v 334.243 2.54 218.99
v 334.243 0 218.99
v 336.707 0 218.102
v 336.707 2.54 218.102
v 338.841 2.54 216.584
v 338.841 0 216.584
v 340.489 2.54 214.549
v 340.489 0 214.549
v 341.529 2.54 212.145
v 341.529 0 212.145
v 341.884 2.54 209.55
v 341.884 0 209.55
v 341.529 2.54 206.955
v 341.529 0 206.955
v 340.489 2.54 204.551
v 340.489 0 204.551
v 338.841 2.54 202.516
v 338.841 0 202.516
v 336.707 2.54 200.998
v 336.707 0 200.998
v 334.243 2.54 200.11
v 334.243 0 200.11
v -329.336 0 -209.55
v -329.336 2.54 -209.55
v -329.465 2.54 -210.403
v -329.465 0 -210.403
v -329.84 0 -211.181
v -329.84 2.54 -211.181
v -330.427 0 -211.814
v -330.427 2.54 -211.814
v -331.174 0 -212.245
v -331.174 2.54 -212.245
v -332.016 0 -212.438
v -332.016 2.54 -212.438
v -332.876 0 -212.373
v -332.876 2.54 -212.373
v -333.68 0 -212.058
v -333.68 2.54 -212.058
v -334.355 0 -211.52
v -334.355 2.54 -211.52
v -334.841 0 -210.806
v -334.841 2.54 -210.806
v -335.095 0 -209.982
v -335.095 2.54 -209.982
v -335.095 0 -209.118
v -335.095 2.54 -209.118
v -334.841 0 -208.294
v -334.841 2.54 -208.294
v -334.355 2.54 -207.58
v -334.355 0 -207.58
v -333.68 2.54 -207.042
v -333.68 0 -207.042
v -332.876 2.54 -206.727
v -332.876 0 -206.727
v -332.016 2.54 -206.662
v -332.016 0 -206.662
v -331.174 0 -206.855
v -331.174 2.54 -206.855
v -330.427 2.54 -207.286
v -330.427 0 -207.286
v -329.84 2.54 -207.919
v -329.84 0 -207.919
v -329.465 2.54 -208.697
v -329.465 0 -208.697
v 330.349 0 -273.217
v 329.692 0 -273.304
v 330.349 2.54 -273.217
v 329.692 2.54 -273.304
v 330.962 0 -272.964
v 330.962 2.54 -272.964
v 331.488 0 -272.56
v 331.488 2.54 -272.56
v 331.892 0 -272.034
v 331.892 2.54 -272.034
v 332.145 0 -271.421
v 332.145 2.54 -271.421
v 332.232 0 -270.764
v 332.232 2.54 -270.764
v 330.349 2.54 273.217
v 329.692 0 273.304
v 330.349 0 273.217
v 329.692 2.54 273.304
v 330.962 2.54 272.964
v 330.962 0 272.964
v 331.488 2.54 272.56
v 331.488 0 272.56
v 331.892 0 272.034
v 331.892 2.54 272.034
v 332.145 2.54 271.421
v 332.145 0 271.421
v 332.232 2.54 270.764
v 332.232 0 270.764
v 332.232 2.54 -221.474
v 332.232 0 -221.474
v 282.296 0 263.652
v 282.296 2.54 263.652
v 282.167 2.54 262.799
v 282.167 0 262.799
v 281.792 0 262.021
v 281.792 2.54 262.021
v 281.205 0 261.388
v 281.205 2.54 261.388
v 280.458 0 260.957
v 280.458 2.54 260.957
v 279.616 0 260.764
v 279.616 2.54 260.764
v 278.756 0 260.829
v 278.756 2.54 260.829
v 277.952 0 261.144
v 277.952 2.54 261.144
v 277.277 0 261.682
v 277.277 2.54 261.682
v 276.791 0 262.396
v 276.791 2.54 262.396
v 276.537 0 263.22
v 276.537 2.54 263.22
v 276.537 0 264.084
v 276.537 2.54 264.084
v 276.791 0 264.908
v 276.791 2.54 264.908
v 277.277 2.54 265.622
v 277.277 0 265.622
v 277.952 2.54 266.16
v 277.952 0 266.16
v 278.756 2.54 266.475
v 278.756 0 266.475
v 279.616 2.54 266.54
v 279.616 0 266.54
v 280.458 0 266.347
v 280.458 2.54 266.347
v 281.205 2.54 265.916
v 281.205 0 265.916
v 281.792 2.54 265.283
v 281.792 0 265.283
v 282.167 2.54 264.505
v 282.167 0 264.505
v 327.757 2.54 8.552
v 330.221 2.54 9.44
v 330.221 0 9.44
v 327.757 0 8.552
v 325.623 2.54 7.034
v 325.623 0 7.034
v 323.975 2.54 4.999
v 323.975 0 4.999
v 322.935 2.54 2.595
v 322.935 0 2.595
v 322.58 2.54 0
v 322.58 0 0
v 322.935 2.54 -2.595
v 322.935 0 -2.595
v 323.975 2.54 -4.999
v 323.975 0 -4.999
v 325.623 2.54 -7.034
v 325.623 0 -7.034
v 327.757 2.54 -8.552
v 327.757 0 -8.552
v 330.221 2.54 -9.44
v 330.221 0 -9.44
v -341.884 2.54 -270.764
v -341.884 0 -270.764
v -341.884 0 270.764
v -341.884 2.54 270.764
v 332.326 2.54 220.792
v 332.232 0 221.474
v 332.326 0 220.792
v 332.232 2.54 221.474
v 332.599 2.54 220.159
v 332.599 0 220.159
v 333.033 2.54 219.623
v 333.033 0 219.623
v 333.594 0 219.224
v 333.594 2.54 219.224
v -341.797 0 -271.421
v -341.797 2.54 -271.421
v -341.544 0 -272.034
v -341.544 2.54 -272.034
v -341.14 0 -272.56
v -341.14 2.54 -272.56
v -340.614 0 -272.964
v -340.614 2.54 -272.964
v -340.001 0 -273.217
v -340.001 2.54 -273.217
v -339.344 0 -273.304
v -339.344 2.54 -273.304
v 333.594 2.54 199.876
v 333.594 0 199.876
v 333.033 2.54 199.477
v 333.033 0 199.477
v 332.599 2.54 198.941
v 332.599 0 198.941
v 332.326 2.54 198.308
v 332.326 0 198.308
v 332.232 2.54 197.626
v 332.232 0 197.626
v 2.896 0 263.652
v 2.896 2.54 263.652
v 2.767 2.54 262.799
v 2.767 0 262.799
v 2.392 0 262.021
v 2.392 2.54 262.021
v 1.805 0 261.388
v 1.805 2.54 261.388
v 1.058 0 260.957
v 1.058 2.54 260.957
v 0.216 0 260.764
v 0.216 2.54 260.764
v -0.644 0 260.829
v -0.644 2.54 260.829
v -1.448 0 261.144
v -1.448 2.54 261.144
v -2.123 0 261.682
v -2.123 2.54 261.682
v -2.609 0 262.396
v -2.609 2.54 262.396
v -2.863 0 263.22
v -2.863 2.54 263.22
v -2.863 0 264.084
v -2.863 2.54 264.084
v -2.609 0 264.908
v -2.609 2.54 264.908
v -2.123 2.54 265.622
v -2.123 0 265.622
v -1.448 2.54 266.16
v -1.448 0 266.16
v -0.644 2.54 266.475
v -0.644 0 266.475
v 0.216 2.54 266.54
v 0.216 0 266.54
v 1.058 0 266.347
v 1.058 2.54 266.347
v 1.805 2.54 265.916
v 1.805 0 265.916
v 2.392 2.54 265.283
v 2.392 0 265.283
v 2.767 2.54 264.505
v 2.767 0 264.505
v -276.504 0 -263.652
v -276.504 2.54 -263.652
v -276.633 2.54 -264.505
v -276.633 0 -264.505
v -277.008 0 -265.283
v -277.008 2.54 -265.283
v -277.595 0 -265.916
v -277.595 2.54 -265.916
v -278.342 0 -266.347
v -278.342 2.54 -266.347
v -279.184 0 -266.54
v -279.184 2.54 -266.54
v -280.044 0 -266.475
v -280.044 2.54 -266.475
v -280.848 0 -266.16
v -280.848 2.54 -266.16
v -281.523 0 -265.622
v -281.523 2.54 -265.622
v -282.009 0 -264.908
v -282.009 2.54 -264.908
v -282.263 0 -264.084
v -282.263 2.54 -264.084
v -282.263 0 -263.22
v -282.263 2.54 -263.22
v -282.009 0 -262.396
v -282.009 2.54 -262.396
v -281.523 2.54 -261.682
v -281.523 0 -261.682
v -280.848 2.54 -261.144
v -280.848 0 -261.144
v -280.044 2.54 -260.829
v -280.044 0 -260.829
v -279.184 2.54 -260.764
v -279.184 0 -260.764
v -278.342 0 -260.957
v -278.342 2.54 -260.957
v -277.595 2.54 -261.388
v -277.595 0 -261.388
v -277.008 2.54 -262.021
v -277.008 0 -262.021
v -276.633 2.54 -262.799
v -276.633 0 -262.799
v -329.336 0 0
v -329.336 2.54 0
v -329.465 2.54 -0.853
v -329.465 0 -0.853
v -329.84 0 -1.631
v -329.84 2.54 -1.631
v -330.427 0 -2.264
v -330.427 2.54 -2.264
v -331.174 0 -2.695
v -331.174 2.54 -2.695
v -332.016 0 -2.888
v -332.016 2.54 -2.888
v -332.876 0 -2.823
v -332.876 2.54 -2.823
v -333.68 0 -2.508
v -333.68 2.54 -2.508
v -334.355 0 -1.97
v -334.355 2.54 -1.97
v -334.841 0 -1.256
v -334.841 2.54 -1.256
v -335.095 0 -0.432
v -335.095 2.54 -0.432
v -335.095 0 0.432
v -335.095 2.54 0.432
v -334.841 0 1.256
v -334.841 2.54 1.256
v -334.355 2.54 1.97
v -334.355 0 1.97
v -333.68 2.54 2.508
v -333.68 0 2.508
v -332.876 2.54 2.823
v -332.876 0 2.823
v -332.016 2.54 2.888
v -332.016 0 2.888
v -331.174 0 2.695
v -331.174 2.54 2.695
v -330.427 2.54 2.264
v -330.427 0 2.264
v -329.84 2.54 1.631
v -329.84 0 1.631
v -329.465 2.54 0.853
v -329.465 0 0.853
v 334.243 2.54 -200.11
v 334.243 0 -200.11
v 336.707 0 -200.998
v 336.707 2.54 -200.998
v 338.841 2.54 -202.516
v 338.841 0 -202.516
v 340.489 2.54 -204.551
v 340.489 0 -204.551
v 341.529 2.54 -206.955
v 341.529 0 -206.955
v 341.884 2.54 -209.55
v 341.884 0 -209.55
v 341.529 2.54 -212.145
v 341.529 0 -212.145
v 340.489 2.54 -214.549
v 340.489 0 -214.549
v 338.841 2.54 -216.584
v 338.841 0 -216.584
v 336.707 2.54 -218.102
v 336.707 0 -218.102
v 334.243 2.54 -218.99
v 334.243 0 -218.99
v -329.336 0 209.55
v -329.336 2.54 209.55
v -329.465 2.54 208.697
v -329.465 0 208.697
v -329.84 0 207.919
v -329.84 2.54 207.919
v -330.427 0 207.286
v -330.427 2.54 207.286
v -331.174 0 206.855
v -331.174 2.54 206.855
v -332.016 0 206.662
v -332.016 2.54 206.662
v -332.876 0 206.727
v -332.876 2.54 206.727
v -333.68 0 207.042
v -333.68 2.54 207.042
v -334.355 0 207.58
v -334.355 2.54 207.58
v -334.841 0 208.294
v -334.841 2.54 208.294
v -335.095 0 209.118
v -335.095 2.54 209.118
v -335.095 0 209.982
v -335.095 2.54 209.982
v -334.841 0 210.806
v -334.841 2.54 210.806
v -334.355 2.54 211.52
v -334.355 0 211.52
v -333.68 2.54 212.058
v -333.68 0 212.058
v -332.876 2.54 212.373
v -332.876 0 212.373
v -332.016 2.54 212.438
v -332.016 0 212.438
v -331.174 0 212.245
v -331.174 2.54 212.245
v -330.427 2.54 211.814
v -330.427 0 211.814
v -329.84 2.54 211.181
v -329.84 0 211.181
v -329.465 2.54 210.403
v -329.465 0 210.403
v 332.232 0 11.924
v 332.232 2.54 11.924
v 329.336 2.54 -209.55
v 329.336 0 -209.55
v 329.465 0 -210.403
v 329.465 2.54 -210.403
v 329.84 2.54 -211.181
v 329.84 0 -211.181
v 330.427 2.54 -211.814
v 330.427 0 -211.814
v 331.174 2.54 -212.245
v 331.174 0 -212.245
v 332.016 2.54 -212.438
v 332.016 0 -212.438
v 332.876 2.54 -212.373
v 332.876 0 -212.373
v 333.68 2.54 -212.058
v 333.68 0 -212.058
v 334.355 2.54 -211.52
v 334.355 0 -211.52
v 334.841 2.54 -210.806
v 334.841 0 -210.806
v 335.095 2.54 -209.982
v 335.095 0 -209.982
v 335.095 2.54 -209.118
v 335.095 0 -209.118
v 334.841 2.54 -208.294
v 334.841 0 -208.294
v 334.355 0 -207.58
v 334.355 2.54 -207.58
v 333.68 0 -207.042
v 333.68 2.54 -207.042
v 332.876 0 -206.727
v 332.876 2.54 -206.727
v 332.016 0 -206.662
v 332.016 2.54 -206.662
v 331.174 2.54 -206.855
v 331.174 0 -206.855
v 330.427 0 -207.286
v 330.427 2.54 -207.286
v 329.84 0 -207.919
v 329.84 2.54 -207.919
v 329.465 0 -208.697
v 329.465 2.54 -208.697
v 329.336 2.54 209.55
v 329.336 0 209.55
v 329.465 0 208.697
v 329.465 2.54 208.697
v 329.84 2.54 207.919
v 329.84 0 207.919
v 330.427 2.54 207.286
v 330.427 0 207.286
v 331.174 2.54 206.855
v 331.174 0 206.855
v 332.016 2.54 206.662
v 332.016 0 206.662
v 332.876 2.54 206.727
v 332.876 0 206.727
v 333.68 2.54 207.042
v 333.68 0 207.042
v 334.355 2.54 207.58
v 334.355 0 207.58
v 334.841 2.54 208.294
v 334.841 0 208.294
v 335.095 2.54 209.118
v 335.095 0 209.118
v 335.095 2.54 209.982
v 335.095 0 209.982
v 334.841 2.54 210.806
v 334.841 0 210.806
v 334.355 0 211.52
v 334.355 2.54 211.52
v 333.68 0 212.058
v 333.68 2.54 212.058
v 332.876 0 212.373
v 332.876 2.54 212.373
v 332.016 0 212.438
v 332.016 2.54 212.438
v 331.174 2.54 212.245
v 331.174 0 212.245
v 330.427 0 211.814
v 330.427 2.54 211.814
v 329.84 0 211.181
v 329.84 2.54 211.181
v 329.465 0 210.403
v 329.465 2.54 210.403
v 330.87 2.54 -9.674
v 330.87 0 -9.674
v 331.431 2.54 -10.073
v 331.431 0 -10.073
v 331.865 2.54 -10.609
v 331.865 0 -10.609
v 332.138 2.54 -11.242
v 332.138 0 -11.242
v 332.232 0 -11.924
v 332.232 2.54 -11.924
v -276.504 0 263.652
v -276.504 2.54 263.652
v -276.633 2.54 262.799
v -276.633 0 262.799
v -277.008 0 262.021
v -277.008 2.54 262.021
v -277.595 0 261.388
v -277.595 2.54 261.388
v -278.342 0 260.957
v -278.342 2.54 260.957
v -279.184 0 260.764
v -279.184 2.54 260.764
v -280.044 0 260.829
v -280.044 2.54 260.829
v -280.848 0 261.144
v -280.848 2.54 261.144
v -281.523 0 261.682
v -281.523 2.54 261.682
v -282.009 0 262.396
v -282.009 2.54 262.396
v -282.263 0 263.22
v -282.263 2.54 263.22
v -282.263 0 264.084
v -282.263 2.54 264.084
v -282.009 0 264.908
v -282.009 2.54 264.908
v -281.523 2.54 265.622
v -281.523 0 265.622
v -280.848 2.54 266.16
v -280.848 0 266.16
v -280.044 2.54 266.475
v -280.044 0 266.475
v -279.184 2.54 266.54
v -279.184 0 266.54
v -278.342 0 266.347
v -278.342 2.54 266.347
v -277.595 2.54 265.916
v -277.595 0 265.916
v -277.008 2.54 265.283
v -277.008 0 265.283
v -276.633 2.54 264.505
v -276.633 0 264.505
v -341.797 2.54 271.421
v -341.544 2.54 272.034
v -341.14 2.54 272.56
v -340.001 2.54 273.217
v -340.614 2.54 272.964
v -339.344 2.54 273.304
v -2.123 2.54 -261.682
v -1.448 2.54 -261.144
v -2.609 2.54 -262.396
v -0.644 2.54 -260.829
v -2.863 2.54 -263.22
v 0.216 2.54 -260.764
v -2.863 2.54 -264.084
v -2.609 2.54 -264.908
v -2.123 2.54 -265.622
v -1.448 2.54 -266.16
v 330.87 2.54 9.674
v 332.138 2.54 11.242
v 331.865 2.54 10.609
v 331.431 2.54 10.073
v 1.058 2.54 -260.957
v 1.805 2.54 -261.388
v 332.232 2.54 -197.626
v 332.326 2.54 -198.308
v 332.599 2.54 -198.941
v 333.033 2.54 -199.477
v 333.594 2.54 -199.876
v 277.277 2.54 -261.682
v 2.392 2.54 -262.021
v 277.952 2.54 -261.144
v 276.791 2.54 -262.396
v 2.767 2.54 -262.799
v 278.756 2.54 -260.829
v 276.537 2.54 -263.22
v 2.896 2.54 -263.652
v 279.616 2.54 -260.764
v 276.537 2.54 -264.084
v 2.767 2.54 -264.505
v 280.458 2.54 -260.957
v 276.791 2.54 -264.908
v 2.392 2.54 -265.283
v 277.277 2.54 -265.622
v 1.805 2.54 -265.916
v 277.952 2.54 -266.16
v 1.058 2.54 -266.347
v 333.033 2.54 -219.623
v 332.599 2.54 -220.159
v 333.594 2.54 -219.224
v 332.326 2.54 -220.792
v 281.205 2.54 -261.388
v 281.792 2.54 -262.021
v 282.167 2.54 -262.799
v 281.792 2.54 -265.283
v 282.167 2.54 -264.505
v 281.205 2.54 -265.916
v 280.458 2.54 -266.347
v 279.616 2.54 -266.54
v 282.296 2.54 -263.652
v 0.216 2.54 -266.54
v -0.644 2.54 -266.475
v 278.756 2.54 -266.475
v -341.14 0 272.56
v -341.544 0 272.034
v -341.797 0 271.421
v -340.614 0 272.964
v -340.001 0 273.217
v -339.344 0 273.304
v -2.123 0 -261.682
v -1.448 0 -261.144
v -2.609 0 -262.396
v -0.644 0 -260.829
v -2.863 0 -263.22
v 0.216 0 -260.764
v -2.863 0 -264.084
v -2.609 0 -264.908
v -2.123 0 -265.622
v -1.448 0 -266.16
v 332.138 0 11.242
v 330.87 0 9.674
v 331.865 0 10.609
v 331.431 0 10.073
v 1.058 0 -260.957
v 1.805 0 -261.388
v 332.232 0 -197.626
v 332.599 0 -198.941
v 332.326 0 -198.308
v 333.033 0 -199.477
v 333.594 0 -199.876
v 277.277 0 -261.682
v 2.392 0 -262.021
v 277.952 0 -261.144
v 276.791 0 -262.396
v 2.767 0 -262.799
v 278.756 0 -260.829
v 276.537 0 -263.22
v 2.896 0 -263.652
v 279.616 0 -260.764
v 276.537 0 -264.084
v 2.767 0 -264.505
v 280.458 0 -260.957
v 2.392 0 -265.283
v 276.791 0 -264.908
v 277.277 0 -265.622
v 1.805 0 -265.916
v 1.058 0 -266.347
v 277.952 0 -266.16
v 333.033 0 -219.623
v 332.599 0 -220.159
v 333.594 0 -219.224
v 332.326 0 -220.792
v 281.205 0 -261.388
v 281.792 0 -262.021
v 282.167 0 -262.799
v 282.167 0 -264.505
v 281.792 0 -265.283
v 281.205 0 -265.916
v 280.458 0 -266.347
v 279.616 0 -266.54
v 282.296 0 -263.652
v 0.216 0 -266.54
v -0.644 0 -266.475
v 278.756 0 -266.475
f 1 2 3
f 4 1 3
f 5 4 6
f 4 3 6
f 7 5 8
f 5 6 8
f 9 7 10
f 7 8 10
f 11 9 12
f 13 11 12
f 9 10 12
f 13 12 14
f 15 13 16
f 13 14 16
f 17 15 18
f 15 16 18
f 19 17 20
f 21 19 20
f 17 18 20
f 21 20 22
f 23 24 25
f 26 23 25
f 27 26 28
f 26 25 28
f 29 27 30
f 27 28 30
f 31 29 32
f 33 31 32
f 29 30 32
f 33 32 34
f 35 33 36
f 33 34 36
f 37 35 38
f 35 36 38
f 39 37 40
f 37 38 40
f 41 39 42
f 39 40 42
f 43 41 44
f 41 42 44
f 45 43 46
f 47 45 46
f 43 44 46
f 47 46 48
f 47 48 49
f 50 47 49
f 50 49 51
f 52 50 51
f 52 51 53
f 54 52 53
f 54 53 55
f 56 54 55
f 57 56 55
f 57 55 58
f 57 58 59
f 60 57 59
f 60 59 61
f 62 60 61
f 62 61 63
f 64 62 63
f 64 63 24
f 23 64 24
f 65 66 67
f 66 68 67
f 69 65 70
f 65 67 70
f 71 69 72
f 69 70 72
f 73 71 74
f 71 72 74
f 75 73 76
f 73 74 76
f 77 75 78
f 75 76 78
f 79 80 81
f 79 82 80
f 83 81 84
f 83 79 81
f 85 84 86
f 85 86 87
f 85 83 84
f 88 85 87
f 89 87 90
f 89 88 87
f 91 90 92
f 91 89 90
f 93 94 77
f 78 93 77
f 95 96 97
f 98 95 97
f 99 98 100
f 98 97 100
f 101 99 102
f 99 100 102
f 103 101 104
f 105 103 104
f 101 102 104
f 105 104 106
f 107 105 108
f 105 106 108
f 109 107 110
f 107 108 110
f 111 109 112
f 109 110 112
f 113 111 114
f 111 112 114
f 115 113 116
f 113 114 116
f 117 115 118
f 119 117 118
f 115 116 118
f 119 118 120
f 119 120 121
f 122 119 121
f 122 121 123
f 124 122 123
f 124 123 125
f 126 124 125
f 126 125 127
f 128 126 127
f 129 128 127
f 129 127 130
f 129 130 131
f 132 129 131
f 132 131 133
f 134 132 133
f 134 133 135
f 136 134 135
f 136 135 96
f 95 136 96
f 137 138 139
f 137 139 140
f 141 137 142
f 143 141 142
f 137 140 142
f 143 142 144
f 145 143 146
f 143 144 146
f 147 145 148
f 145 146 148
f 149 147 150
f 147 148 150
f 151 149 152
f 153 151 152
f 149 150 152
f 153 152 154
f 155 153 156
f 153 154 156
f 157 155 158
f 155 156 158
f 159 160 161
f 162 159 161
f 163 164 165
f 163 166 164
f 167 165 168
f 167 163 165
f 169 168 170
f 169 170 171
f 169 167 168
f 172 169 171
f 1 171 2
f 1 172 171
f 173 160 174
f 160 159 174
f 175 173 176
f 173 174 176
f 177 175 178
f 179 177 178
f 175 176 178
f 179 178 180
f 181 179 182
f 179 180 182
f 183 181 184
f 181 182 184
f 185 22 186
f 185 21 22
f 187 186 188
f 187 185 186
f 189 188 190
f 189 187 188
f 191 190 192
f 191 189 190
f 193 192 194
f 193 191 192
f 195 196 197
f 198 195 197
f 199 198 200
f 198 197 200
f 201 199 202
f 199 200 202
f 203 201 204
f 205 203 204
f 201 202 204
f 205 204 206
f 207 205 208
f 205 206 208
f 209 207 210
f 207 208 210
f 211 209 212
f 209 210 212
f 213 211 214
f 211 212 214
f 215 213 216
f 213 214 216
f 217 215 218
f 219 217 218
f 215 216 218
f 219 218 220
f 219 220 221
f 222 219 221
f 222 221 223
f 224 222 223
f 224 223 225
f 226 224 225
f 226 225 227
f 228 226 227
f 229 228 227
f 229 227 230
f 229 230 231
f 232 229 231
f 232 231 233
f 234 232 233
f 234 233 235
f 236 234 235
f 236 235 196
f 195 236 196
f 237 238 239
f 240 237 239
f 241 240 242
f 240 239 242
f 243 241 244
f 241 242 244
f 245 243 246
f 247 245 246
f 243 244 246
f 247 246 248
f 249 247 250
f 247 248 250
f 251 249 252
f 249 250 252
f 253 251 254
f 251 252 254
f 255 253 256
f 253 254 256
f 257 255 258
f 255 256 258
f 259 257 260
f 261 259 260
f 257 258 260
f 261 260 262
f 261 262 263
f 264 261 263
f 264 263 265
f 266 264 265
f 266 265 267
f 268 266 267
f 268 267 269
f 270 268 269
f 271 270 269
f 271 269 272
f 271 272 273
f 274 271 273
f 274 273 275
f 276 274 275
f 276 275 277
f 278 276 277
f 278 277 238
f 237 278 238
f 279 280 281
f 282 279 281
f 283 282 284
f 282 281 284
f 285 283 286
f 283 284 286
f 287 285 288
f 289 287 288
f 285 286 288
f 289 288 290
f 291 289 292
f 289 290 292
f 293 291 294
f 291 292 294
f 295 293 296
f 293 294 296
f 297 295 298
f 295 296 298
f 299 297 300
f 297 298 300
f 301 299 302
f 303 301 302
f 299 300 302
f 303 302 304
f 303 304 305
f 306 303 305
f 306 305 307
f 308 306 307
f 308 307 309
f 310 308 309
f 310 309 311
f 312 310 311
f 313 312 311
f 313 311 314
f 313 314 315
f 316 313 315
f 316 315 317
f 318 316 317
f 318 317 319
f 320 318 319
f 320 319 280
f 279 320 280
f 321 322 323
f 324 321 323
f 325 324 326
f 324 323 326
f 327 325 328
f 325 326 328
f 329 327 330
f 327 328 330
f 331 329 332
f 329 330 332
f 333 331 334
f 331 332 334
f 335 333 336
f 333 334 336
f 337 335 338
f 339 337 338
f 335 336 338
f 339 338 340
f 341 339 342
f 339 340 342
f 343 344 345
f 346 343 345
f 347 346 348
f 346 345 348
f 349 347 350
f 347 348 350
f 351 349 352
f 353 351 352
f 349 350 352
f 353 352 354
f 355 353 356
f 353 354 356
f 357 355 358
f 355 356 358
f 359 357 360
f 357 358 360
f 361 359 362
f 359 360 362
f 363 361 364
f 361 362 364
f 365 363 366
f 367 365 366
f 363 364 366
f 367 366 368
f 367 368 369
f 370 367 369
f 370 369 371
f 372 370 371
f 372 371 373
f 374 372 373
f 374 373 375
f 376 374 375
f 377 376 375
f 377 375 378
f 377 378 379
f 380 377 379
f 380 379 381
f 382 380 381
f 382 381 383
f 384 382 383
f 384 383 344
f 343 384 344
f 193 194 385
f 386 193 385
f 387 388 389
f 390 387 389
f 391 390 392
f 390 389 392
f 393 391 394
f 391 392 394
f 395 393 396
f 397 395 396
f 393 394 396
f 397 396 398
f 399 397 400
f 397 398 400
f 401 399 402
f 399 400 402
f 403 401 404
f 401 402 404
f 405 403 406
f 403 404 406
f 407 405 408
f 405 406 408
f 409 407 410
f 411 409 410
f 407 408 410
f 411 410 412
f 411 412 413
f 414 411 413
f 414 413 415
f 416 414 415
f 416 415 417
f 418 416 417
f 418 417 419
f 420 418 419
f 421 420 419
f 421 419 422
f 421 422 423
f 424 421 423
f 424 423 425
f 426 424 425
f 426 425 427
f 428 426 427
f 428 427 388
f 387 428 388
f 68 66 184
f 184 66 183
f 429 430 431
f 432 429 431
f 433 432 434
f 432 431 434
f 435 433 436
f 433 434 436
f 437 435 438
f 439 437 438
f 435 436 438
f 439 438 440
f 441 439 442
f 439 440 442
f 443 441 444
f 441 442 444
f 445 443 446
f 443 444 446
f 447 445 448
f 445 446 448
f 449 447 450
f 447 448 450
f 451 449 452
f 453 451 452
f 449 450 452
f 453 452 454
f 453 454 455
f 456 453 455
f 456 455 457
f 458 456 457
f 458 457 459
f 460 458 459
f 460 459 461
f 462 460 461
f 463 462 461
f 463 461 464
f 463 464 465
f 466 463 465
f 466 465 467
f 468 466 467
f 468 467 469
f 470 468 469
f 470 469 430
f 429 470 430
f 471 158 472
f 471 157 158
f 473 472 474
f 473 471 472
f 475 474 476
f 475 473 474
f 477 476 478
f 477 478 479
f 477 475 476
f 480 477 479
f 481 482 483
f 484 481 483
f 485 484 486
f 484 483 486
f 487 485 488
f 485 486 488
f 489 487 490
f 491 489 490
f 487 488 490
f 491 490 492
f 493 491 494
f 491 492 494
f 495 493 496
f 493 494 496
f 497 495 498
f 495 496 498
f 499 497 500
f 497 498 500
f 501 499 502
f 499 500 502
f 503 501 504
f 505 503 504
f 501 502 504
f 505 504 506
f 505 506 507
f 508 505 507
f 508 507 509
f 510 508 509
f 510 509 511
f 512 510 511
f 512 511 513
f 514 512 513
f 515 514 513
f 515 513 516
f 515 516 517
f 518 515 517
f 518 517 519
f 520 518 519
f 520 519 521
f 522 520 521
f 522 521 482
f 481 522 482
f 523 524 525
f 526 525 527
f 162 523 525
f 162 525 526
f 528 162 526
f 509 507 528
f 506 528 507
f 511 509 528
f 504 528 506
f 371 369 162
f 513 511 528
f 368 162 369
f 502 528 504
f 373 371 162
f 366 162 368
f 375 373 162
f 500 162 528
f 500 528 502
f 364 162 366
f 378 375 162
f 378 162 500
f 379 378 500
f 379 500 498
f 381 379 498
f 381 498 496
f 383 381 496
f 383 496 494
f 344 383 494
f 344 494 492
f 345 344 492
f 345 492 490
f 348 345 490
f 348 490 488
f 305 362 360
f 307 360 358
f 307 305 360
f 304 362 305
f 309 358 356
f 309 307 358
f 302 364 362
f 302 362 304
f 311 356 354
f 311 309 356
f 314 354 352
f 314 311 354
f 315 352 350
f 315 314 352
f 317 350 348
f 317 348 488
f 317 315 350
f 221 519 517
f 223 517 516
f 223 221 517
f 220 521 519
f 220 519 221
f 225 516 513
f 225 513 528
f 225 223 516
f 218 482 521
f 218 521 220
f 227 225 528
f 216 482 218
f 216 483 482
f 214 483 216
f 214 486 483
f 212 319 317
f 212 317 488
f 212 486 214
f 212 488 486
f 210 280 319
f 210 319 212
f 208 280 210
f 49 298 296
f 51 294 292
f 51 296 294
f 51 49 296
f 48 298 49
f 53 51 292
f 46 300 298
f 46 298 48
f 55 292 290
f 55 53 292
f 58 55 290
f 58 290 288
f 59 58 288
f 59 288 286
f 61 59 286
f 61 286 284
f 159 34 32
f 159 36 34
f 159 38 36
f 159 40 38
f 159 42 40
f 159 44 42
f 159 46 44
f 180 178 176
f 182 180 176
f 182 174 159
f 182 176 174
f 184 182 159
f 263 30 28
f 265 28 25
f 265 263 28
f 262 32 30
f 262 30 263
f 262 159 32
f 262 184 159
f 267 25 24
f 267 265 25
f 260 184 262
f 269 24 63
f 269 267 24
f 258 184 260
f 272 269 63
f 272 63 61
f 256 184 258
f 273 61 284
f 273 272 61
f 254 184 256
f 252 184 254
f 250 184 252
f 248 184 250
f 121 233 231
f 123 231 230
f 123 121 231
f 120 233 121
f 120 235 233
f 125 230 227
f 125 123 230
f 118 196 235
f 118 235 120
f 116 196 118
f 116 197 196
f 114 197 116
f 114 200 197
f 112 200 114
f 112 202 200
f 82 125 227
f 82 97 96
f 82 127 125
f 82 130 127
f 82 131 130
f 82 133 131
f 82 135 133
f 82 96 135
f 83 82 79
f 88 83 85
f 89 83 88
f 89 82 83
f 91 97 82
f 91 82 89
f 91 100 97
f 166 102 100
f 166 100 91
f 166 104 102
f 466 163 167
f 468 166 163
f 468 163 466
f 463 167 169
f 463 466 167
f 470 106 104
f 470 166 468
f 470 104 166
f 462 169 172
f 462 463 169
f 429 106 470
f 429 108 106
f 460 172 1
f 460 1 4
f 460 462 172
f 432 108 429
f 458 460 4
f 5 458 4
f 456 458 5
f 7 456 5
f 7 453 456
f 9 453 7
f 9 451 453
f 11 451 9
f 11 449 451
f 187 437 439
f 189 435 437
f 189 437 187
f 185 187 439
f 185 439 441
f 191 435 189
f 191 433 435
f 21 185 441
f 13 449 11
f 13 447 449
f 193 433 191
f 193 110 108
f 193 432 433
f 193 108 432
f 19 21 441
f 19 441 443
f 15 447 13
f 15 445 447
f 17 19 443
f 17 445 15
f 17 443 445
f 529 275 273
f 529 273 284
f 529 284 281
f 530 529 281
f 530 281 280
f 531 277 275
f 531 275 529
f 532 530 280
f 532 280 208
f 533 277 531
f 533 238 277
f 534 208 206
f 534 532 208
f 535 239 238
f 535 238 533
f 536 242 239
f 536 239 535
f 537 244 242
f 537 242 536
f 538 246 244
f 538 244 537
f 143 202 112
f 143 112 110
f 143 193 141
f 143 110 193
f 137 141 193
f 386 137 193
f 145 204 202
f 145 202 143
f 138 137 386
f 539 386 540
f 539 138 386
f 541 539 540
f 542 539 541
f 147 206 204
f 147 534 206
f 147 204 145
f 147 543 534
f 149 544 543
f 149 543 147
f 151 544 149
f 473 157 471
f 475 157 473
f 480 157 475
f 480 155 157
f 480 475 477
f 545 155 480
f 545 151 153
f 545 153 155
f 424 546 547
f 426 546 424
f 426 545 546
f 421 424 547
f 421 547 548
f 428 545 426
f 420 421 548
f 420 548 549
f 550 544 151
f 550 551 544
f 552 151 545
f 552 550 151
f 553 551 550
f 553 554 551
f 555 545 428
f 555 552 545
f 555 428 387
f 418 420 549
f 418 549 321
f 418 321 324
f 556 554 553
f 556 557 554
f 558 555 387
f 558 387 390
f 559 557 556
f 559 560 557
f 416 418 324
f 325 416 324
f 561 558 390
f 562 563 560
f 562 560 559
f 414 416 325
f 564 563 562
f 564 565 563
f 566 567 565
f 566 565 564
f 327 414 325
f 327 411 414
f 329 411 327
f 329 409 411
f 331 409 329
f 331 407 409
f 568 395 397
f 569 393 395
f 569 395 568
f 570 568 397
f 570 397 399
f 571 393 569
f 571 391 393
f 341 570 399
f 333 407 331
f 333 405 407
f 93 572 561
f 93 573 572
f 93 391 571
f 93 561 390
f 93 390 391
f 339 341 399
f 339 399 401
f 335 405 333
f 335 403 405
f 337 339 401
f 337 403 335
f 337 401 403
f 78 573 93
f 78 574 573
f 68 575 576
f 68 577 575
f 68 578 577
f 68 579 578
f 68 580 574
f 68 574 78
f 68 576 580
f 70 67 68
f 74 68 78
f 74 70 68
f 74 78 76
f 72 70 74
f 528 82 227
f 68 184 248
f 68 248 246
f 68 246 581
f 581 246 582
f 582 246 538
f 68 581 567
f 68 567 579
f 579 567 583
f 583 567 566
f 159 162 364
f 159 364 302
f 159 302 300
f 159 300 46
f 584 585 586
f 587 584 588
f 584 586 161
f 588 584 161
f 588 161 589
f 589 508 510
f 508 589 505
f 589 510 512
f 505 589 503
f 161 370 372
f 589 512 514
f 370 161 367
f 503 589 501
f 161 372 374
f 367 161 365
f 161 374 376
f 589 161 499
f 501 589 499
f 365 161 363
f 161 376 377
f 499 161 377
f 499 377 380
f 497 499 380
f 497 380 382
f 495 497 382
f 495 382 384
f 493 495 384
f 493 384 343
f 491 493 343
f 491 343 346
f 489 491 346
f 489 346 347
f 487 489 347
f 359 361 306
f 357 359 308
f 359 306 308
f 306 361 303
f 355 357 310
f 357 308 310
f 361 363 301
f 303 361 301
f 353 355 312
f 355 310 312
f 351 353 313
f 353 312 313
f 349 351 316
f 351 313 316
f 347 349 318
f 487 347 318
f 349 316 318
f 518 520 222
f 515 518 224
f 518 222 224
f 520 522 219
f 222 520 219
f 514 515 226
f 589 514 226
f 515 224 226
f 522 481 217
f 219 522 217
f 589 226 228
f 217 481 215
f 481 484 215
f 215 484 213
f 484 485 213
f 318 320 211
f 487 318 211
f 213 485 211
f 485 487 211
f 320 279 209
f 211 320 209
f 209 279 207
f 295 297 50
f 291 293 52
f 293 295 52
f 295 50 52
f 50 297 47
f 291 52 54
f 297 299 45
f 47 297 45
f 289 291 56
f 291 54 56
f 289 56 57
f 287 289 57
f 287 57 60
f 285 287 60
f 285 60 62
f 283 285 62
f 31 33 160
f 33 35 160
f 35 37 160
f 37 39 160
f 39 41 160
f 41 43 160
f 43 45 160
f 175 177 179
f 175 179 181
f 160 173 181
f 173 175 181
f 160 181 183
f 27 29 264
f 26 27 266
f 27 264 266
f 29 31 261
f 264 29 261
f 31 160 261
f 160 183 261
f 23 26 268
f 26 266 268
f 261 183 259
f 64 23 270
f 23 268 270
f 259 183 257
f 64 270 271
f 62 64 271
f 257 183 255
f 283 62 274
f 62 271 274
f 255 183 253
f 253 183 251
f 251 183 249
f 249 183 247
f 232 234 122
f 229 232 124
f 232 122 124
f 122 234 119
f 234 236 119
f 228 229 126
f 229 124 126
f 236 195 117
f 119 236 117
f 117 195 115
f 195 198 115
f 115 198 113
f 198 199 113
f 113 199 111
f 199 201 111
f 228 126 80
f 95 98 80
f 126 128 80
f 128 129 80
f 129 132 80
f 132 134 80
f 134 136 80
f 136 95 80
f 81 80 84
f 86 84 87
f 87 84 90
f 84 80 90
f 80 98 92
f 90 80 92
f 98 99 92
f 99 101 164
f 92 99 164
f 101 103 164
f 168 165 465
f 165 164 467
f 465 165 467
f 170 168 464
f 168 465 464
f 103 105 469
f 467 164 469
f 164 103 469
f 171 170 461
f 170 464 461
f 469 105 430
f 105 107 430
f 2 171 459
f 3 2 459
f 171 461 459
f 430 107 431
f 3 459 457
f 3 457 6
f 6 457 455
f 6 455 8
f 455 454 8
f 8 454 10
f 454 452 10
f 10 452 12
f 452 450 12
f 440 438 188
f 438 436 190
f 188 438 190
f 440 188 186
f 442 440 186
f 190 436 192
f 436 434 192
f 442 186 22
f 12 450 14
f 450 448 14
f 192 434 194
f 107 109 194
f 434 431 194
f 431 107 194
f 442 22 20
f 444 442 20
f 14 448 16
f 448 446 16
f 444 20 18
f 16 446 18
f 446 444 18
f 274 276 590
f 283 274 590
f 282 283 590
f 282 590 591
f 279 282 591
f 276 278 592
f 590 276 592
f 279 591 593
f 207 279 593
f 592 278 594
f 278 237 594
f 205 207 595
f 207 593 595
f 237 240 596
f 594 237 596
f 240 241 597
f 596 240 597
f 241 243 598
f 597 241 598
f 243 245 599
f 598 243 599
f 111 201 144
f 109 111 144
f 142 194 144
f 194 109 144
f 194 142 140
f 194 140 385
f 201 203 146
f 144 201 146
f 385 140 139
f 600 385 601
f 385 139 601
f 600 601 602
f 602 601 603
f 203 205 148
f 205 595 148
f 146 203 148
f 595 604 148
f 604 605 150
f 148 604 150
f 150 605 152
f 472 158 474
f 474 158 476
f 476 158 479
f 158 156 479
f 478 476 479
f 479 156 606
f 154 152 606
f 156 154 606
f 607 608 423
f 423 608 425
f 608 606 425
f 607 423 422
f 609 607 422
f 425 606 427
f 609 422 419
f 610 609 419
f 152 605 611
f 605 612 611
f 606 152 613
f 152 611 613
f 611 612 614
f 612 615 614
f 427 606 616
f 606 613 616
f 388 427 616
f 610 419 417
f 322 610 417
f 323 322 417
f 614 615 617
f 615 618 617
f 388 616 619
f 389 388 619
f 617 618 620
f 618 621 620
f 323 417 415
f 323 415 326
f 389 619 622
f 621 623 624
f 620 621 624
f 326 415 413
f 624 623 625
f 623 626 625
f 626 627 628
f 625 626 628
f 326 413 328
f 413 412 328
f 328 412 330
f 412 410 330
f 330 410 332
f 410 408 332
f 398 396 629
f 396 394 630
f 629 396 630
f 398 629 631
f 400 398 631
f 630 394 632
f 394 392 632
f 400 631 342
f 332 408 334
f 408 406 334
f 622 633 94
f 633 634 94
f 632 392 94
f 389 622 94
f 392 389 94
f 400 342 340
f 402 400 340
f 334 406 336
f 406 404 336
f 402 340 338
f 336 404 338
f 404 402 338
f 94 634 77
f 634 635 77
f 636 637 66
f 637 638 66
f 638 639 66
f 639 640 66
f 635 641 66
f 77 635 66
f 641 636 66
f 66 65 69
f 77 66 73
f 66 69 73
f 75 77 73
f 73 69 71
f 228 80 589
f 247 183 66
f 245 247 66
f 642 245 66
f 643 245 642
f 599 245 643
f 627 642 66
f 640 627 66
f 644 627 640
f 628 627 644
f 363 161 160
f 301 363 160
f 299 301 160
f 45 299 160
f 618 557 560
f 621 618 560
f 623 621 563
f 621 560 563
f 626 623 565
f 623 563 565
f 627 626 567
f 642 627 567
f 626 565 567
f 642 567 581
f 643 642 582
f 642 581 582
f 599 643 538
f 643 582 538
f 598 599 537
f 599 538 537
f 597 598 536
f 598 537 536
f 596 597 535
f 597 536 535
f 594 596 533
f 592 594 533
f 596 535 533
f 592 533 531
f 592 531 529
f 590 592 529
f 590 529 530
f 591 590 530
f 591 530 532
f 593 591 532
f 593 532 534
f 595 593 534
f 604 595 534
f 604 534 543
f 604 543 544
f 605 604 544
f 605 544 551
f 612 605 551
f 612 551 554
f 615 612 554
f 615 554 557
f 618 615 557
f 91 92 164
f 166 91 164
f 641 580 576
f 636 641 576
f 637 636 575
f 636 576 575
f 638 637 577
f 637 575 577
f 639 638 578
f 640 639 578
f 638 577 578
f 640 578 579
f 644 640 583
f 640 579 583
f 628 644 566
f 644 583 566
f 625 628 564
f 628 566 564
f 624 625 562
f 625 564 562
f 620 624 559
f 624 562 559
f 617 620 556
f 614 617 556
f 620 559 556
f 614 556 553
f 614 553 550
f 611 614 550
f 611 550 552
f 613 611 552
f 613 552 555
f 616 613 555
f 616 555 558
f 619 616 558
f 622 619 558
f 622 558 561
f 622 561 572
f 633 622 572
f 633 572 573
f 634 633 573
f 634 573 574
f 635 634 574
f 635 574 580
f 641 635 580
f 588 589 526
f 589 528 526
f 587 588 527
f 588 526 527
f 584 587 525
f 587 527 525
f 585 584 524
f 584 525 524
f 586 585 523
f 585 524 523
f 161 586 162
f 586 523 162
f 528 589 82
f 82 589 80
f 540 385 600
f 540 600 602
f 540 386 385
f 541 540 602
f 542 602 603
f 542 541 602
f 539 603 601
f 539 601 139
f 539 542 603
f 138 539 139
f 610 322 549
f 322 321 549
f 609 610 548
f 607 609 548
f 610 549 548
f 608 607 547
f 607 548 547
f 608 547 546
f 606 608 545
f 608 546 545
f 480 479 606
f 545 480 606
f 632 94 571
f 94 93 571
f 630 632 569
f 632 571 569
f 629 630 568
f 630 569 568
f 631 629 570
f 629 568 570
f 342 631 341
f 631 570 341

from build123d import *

# Parameters (mm, degrees)
BOSS_EXTRUDE1_DEPTH        = 2.54
F_1_0_228_DIAMETER_HOLE1_D = 5.7912
FILLET1_R                  = 2.54
F_1_0_228_DIAMETER_HOLE2_D = 5.7912


with BuildPart() as part:
    # Sketch1 → Boss-Extrude1 (new body)
    with BuildSketch(Plane(origin=(0, 0, 0), x_dir=(1, 0, 0), z_dir=(0, 1, 0))):
        with BuildLine():
            Line((-341.884, -273.304), (332.232, -273.304))
            Line((332.232, -273.304), (332.232, -219.202))
            ThreePointArc((332.232, -219.202), (341.884, -209.55), (332.232, -199.898))
            Line((332.232, -199.898), (332.232, -9.652))
            ThreePointArc((332.232, -9.652), (322.58, 0), (332.232, 9.652))
            Line((332.232, 9.652), (332.232, 199.898))
            ThreePointArc((332.232, 199.898), (341.884, 209.55), (332.232, 219.202))
            Line((332.232, 219.202), (332.232, 273.304))
            Line((332.232, 273.304), (-341.884, 273.304))
            Line((-341.884, 273.304), (-341.884, -273.304))
        make_face()
    extrude(amount=BOSS_EXTRUDE1_DEPTH)

    # #1 (0.228) Diameter Hole1 (through all)
    with Locations(Plane(origin=(0, 2.54, 0), x_dir=(1, 0, 0), z_dir=(0, 1, 0))):
        with Locations((332.232, 209.55), (332.232, -209.55)):
            Hole(F_1_0_228_DIAMETER_HOLE1_D / 2)

    # Fillet1
    fillet1_edges = [part.edges().sort_by_distance(p)[0] for p in [
        (-341.884, 1.27, -273.304),
        (332.232, 1.27, -273.304),
        (332.232, 1.27, -219.202),
        (332.232, 1.27, -199.898),
        (332.232, 1.27, -9.652),
        (332.232, 1.27, 9.652),
        (332.232, 1.27, 199.898),
        (332.232, 1.27, 219.202),
        (332.232, 1.27, 273.304),
        (-341.884, 1.27, 273.304),
    ]]
    fillet(fillet1_edges, radius=FILLET1_R)

    # #1 (0.228) Diameter Hole2 (through all)
    with Locations(Plane(origin=(0, 0, 0), x_dir=(-1, 0, 0), z_dir=(0, -1, 0))):
        with Locations((-279.4, 263.652), (0, 263.652), (279.4, 263.652), (332.232, 209.55), (332.232, 0), (332.232, -209.55), (279.4, -263.652), (0, -263.652), (-279.4, -263.652)):
            Hole(F_1_0_228_DIAMETER_HOLE2_D / 2)


solid = part.part
